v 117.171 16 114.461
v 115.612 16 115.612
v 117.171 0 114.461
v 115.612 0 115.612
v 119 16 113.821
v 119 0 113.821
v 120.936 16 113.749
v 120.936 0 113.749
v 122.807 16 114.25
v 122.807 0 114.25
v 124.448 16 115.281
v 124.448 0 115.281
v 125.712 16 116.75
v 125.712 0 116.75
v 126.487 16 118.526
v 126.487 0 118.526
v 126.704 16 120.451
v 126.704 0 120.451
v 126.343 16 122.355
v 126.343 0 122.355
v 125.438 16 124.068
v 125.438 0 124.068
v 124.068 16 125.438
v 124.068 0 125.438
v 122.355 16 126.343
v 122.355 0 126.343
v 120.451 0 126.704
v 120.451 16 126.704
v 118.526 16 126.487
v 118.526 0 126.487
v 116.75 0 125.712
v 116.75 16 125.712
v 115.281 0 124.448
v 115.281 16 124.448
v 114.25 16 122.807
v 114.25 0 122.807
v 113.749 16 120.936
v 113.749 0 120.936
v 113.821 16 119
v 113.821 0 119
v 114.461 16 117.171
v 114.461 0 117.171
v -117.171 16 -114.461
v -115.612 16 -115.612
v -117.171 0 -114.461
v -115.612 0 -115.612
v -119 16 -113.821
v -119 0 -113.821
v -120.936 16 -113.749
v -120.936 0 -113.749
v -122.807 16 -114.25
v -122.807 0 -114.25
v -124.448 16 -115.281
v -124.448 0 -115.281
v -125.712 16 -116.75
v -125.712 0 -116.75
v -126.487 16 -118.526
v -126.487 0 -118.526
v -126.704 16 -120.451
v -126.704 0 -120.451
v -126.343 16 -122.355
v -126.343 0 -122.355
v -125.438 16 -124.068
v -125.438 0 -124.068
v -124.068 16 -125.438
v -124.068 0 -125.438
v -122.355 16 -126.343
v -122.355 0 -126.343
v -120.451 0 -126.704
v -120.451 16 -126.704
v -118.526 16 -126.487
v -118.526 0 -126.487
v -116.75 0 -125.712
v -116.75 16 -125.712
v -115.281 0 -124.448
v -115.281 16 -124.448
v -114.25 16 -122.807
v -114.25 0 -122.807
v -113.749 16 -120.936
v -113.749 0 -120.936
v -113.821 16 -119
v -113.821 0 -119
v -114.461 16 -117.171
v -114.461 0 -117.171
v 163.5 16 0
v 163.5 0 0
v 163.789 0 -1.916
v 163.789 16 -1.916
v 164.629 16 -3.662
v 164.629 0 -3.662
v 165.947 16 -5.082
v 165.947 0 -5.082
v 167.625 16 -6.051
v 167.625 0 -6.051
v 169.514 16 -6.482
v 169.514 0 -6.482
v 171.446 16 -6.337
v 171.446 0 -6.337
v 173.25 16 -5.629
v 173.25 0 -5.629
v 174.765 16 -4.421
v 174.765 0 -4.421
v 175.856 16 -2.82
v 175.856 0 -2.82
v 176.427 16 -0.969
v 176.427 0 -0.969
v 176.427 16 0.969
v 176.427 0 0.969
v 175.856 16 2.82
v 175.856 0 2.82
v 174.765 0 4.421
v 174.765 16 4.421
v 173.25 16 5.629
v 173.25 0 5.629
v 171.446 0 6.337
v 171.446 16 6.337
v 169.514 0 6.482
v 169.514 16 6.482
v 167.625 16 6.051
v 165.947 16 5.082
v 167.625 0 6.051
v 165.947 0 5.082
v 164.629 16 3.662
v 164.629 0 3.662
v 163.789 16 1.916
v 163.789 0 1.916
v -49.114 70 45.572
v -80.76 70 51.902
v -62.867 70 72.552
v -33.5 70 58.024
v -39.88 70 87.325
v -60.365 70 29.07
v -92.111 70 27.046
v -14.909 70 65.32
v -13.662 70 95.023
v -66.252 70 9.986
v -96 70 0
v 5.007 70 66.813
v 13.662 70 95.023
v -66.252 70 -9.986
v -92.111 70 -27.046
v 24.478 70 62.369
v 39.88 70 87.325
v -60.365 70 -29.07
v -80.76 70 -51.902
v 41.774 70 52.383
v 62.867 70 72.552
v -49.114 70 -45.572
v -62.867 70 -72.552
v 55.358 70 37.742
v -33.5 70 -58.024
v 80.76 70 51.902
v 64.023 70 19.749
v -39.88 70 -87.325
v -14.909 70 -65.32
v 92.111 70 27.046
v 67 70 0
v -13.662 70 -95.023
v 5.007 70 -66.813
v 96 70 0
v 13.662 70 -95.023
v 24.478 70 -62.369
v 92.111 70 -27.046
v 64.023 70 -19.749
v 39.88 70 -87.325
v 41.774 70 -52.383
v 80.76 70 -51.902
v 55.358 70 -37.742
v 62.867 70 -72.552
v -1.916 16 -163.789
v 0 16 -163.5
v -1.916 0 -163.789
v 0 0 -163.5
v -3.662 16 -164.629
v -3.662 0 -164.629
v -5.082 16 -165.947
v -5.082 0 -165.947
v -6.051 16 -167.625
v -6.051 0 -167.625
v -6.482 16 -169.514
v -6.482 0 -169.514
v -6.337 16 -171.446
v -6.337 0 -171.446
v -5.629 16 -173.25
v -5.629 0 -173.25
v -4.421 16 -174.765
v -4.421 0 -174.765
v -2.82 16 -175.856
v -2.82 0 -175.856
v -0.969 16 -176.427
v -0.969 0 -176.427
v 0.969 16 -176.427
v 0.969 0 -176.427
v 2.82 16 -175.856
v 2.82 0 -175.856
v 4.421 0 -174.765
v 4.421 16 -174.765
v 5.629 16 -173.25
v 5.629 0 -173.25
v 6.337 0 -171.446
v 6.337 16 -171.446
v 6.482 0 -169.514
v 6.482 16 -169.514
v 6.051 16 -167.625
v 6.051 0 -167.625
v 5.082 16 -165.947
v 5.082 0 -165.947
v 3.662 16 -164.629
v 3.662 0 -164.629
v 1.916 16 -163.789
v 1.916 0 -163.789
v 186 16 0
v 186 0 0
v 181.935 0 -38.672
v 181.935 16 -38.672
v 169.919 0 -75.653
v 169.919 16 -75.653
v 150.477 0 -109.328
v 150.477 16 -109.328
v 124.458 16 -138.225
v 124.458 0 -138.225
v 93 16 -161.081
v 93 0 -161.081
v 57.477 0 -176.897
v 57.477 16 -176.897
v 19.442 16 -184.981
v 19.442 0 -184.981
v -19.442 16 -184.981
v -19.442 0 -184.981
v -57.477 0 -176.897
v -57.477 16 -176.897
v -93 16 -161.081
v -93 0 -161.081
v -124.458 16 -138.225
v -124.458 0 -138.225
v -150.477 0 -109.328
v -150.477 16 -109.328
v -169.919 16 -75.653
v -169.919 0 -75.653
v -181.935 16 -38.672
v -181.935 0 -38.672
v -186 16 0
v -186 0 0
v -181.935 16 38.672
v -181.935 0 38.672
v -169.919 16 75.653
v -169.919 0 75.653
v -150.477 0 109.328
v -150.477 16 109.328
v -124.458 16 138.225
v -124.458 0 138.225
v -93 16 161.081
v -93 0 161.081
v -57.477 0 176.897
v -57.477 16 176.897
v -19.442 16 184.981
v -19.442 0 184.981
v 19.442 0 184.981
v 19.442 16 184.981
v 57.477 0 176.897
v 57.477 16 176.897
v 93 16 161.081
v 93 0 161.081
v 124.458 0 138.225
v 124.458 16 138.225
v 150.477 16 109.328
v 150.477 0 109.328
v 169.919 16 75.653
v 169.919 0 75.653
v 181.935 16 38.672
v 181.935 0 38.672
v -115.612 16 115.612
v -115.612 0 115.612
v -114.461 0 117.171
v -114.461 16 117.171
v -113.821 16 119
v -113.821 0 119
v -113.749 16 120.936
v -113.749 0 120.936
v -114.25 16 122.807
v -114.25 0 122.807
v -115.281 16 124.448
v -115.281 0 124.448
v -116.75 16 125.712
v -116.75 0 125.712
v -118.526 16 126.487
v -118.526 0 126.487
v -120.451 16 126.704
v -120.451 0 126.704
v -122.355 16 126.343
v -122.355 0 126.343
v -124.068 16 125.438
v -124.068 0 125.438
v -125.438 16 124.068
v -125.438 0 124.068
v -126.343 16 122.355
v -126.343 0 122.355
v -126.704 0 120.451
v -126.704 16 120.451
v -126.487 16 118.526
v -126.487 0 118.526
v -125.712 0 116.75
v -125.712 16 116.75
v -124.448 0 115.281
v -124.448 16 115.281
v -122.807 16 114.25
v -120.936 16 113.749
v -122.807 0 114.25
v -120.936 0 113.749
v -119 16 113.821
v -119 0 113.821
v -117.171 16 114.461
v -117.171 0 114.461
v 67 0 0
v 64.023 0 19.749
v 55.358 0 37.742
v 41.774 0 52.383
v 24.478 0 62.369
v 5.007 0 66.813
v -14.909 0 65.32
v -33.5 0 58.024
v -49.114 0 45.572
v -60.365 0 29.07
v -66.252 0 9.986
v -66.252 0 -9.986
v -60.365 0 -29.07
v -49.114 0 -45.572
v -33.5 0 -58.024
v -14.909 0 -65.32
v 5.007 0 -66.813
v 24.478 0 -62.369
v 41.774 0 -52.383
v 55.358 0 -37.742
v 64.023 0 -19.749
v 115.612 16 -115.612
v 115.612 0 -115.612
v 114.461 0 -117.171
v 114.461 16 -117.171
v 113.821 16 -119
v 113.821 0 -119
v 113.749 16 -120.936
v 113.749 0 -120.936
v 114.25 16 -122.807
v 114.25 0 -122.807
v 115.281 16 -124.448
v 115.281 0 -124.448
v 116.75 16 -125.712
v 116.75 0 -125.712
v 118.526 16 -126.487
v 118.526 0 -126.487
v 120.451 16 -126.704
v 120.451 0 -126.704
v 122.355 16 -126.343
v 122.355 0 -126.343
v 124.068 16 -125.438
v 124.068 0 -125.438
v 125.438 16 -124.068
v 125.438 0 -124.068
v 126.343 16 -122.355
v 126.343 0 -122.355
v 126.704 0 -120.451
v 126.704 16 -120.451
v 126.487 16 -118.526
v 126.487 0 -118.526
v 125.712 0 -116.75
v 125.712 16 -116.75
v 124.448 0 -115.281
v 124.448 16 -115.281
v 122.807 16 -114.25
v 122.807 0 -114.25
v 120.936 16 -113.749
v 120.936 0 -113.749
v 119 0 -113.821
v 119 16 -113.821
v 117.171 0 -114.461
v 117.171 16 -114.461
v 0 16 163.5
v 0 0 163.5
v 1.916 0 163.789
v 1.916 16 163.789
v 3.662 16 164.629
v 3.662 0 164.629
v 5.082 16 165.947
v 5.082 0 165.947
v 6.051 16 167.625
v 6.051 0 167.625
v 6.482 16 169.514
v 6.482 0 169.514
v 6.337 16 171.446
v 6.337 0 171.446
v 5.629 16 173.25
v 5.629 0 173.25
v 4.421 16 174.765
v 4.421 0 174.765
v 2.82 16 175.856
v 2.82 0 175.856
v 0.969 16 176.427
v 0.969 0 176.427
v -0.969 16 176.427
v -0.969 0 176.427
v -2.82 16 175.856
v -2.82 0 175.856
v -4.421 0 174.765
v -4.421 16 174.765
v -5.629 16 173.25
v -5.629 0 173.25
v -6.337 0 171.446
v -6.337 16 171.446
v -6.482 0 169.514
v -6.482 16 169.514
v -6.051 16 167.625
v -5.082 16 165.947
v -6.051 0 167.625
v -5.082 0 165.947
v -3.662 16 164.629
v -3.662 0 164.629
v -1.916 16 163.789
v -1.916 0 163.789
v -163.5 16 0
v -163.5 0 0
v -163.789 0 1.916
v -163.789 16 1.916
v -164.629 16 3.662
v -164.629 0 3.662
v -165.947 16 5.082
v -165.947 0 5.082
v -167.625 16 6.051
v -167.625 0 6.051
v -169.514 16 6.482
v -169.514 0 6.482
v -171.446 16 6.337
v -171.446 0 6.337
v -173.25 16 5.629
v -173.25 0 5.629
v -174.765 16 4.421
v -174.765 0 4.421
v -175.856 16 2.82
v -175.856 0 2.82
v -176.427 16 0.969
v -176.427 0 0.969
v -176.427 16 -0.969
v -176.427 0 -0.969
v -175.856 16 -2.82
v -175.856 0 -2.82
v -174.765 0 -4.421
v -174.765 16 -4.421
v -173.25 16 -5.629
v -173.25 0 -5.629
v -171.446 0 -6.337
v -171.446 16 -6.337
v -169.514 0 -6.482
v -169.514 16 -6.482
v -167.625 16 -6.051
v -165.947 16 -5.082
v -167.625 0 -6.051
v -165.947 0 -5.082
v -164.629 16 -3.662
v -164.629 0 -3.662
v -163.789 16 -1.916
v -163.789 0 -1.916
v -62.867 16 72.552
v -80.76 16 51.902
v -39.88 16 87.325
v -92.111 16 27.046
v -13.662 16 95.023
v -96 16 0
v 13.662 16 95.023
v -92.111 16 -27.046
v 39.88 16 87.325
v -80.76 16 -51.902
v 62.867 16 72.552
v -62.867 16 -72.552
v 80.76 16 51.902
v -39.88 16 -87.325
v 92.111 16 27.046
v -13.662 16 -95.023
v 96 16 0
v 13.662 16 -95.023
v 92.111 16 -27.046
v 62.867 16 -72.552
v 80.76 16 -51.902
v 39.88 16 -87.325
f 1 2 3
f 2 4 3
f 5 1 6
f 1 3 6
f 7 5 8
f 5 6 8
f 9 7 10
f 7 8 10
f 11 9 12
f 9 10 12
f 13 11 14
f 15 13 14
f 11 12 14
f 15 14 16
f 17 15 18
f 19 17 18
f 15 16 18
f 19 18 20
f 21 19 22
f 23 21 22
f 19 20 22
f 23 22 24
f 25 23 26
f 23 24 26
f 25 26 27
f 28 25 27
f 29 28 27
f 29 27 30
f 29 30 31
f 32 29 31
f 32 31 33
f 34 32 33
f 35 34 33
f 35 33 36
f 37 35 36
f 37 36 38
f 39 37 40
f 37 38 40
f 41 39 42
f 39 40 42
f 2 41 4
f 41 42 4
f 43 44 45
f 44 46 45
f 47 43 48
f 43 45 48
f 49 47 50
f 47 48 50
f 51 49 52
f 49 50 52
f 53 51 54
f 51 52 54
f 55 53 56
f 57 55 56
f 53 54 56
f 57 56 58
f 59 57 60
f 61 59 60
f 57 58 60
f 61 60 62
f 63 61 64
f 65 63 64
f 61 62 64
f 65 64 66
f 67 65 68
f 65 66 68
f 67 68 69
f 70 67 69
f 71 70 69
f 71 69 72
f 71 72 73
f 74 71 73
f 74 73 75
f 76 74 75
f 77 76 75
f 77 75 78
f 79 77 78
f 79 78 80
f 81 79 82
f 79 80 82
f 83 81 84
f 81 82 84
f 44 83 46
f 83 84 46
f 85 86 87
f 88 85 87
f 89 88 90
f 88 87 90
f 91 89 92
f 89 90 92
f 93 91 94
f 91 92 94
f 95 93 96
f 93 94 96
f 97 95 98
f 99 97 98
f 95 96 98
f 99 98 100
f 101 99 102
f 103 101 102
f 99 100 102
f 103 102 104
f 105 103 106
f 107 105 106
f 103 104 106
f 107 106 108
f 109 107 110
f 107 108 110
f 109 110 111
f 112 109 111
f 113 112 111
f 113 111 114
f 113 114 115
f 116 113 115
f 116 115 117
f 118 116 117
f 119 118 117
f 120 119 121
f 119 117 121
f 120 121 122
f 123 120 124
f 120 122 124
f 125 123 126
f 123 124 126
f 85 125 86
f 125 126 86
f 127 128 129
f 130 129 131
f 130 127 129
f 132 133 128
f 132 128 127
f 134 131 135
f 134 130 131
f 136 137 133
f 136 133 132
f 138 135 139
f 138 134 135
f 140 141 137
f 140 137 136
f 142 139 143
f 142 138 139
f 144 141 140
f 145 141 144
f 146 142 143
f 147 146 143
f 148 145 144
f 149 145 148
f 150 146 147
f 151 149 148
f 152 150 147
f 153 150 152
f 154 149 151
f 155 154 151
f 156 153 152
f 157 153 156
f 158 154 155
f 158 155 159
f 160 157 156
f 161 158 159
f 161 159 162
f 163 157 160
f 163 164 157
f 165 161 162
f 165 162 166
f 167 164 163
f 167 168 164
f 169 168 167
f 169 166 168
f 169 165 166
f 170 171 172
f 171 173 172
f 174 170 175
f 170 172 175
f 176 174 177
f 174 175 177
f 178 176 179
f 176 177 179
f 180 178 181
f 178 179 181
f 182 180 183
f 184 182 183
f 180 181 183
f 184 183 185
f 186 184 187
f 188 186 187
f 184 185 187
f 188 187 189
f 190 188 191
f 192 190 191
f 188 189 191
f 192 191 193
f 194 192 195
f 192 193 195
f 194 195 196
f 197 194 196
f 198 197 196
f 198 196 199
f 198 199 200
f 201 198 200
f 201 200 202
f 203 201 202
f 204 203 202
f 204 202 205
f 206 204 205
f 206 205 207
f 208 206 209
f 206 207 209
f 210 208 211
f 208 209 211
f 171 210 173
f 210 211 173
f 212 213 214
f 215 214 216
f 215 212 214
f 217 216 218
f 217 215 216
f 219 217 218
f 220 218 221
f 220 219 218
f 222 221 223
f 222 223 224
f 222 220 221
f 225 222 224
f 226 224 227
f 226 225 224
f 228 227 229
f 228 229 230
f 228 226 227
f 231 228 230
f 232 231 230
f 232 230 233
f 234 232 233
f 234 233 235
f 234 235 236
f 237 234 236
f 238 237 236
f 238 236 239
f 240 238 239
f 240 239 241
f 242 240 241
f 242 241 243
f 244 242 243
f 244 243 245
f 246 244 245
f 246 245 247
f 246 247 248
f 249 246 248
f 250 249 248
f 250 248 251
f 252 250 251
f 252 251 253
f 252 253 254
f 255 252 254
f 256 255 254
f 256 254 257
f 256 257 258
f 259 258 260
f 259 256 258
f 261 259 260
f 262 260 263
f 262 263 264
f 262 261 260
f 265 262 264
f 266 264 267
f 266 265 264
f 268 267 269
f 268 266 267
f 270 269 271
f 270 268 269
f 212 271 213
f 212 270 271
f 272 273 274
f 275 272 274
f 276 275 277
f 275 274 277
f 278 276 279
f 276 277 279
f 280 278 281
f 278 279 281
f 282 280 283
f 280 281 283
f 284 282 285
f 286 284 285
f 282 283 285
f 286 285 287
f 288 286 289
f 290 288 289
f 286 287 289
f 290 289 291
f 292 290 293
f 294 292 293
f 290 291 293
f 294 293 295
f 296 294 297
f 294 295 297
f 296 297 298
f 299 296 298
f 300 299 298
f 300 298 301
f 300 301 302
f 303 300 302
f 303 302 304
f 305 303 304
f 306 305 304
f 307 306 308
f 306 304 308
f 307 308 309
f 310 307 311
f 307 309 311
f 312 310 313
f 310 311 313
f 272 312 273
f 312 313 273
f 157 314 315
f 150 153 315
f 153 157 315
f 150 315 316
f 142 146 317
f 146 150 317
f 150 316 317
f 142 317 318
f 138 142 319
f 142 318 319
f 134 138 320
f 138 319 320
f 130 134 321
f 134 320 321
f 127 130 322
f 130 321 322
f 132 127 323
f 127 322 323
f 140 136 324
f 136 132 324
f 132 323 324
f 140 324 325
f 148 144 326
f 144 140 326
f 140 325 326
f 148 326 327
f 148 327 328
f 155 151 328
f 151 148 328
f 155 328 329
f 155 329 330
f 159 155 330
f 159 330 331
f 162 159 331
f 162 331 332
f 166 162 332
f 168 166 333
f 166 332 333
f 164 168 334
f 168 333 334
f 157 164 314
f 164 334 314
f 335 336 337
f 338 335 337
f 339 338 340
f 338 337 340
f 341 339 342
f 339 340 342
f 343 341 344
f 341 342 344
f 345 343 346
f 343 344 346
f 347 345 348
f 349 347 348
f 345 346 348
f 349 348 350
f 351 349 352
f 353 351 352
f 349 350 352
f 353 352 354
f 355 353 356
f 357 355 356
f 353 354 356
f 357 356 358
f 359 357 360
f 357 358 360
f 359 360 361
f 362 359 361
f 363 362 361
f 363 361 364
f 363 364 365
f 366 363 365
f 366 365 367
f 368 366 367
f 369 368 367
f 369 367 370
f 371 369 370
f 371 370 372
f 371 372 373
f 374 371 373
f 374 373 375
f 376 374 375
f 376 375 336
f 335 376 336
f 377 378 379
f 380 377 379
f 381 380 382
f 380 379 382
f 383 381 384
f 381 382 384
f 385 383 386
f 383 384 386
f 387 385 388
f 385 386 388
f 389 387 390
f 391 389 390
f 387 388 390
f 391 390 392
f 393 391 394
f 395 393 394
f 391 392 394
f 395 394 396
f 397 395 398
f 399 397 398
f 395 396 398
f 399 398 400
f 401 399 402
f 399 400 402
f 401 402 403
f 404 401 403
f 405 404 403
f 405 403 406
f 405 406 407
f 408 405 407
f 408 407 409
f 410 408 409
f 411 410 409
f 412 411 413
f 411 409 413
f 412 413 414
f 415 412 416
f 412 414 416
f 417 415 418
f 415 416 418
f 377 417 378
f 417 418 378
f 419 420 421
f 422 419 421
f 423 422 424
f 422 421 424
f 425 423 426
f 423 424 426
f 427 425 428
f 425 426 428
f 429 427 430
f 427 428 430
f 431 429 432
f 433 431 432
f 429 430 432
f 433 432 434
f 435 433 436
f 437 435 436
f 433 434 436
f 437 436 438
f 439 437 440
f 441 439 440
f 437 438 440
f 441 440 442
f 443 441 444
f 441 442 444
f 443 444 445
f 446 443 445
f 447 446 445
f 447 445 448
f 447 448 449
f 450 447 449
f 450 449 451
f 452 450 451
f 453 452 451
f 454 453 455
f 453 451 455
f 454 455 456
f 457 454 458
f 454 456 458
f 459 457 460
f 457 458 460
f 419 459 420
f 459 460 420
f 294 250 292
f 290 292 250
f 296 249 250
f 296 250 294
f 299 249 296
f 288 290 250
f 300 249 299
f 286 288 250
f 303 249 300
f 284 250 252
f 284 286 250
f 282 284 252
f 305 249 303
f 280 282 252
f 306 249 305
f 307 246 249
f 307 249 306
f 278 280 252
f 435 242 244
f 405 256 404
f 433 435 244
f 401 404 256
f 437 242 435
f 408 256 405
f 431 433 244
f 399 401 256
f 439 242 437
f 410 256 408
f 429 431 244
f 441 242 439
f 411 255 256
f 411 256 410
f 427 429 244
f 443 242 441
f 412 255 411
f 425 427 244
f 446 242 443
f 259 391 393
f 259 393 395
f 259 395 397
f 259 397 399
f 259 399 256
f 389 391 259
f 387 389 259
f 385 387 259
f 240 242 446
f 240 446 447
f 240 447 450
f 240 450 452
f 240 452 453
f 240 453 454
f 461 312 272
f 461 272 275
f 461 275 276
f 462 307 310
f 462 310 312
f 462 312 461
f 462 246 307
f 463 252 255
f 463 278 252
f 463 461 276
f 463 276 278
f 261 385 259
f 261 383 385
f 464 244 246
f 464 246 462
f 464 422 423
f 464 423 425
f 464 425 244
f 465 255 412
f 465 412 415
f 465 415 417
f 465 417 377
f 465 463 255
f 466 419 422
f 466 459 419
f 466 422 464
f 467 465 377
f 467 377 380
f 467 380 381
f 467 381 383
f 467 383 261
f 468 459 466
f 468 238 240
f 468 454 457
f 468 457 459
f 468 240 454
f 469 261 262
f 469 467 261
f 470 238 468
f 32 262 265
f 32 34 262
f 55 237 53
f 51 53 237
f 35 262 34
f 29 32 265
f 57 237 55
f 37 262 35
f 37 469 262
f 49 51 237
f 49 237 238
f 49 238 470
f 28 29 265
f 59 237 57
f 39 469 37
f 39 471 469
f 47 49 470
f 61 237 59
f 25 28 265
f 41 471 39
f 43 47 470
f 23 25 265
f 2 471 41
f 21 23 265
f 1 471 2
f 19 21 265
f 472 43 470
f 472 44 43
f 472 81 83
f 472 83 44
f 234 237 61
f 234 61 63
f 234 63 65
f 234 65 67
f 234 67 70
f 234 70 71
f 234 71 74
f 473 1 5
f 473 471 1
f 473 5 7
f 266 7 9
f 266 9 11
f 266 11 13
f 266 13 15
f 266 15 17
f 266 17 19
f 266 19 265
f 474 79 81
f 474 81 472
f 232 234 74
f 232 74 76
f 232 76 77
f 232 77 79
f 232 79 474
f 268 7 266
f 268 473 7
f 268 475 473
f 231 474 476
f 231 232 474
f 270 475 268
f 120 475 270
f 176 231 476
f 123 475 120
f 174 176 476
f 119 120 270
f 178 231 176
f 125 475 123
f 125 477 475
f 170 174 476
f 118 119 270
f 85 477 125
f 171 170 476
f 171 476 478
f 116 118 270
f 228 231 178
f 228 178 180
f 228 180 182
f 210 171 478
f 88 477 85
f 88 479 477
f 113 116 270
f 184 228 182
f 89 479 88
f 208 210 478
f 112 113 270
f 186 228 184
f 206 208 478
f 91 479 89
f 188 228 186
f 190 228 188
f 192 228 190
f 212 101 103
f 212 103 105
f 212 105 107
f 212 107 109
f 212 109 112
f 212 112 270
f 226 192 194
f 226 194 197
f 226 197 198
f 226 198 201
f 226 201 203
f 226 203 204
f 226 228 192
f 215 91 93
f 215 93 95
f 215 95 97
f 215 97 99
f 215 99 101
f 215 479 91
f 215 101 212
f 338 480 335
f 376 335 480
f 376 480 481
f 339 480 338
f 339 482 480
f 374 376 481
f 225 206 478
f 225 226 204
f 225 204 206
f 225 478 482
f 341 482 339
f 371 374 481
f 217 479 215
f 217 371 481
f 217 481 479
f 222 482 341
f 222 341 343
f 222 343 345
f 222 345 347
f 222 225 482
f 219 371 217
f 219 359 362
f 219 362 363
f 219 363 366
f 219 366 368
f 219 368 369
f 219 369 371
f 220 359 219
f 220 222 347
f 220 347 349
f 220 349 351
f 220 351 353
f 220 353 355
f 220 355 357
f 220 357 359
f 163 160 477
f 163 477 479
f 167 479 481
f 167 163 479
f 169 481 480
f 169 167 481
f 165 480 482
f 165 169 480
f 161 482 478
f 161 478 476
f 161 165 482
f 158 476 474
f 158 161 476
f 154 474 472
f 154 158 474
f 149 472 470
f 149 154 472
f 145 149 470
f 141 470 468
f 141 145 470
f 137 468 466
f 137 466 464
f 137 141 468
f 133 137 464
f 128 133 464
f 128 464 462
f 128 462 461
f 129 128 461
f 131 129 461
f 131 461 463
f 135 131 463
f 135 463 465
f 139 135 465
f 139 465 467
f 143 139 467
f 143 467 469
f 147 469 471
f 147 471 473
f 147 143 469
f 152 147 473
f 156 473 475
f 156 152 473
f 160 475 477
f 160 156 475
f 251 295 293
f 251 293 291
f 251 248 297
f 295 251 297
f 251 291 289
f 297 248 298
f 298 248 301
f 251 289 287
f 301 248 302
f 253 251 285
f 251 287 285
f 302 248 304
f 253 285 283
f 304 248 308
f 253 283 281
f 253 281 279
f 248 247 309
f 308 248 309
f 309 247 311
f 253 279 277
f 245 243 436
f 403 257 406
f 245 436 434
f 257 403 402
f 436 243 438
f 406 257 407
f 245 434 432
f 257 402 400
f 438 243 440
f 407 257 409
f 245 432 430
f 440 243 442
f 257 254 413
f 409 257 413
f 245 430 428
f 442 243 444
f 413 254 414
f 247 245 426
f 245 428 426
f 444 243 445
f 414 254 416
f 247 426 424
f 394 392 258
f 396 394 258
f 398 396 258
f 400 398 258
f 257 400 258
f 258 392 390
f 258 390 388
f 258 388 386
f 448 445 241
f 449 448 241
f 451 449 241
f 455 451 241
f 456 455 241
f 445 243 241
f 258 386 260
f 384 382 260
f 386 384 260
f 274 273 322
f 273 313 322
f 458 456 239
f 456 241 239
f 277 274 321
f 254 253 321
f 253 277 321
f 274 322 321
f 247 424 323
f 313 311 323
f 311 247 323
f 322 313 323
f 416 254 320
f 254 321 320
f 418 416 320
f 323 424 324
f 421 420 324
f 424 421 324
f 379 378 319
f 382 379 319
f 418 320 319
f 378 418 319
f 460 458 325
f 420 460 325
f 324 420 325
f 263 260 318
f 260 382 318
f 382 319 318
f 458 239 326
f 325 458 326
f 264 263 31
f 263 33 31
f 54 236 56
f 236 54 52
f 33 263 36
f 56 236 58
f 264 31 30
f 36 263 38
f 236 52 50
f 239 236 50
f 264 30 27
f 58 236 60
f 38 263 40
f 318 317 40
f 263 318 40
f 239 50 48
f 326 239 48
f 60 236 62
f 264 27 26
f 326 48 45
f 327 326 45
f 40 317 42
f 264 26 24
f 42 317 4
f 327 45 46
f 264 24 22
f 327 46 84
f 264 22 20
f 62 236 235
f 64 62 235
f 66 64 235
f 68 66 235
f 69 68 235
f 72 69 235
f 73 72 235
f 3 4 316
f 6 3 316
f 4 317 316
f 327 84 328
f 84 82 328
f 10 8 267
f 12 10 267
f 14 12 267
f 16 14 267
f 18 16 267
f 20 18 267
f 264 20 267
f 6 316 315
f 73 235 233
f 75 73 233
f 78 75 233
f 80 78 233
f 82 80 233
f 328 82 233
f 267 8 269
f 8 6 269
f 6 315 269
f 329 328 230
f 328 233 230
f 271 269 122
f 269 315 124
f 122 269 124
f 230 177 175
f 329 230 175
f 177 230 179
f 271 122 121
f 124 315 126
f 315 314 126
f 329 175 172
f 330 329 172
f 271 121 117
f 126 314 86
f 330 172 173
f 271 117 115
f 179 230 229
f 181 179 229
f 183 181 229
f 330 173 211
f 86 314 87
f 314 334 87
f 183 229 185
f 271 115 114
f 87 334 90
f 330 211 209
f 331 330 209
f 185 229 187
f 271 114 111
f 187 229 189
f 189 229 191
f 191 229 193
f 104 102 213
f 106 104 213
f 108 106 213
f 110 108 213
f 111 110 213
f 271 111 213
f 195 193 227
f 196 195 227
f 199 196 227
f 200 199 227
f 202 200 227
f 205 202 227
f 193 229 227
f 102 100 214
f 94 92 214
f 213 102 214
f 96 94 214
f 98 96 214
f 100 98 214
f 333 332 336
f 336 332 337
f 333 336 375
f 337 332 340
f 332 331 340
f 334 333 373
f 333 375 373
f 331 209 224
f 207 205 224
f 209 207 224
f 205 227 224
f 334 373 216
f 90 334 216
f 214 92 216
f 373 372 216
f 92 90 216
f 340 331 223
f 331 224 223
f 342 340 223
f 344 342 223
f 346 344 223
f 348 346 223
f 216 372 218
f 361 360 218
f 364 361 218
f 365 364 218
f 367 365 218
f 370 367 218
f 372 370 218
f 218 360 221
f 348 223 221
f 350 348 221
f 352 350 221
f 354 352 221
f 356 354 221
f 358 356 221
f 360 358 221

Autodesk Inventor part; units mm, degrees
ref_plane "YZ Plane" through (0, 0, 0) normal (1, 0, 0) x (0, 1, 0)
ref_plane "XZ Plane" through (0, 0, 0) normal (0, 1, 0) x (-1, 0, 0)
ref_plane "XY Plane" through (0, 0, 0) normal (0, 0, 1) x (1, 0, 0)
sketch "Sketch2" plane through (0, 0, 0) normal (0, 0, 1) x (1, 0, 0)
  line L0 (67, 70) -> (67, 0)
  line L1 (67, 0) -> (186, 0)
  line L2 (186, 0) -> (186, 16)
  line L3 (186, 16) -> (96, 16)
  line L4 (96, 16) -> (96, 70)
  line L5 (96, 70) -> (67, 70)
  line L6 (0, 0) -> (0, 134.3394)
  dimension "d1" = 70
  dimension "d2" = 119
  dimension "d3" = 29
  dimension "d4" = 134
  dimension "d5" = 16
revolve "Revolution1" add sketch "Sketch2" angle 360 about axis through (0, 0, 0) along (0, 1, 0)
sketch "Sketch3" plane through (0, 16, 0) normal (0, 1, 0) x (1, 0, 0)
  circle A0 centre (0, 0) radius 170 construction
  point P0 (0, 170)
  dimension "d7" = 340
hole "Hole1" at (0, 16, -170) direction (0, -1, 0) diameter 13 end through all
pattern_circular "Circular Pattern1" count 8 over 360 about axis through (0, -10, 0) along (0, 1, 0) of "Hole1"
equation "\"BendRadius\" = Thickness"
equation "\"BendReliefWidth\" = Thickness"
equation "\"BendReliefDepth\" = 0.5 * Thickness"
equation "\"CornerReliefSize\" = 4 * Thickness"
equation "\"MinimumRemnant\" = 2 * Thickness"
equation "\"TransitionRadius\" = BendRadius"
equation "\"JacobiRadiusSize\" = BendRadius"
equation "\"GapSize\" = Thickness"
equation "\"Thickness\" = 0.5"
properties part number "DMF Hat 2.0"
